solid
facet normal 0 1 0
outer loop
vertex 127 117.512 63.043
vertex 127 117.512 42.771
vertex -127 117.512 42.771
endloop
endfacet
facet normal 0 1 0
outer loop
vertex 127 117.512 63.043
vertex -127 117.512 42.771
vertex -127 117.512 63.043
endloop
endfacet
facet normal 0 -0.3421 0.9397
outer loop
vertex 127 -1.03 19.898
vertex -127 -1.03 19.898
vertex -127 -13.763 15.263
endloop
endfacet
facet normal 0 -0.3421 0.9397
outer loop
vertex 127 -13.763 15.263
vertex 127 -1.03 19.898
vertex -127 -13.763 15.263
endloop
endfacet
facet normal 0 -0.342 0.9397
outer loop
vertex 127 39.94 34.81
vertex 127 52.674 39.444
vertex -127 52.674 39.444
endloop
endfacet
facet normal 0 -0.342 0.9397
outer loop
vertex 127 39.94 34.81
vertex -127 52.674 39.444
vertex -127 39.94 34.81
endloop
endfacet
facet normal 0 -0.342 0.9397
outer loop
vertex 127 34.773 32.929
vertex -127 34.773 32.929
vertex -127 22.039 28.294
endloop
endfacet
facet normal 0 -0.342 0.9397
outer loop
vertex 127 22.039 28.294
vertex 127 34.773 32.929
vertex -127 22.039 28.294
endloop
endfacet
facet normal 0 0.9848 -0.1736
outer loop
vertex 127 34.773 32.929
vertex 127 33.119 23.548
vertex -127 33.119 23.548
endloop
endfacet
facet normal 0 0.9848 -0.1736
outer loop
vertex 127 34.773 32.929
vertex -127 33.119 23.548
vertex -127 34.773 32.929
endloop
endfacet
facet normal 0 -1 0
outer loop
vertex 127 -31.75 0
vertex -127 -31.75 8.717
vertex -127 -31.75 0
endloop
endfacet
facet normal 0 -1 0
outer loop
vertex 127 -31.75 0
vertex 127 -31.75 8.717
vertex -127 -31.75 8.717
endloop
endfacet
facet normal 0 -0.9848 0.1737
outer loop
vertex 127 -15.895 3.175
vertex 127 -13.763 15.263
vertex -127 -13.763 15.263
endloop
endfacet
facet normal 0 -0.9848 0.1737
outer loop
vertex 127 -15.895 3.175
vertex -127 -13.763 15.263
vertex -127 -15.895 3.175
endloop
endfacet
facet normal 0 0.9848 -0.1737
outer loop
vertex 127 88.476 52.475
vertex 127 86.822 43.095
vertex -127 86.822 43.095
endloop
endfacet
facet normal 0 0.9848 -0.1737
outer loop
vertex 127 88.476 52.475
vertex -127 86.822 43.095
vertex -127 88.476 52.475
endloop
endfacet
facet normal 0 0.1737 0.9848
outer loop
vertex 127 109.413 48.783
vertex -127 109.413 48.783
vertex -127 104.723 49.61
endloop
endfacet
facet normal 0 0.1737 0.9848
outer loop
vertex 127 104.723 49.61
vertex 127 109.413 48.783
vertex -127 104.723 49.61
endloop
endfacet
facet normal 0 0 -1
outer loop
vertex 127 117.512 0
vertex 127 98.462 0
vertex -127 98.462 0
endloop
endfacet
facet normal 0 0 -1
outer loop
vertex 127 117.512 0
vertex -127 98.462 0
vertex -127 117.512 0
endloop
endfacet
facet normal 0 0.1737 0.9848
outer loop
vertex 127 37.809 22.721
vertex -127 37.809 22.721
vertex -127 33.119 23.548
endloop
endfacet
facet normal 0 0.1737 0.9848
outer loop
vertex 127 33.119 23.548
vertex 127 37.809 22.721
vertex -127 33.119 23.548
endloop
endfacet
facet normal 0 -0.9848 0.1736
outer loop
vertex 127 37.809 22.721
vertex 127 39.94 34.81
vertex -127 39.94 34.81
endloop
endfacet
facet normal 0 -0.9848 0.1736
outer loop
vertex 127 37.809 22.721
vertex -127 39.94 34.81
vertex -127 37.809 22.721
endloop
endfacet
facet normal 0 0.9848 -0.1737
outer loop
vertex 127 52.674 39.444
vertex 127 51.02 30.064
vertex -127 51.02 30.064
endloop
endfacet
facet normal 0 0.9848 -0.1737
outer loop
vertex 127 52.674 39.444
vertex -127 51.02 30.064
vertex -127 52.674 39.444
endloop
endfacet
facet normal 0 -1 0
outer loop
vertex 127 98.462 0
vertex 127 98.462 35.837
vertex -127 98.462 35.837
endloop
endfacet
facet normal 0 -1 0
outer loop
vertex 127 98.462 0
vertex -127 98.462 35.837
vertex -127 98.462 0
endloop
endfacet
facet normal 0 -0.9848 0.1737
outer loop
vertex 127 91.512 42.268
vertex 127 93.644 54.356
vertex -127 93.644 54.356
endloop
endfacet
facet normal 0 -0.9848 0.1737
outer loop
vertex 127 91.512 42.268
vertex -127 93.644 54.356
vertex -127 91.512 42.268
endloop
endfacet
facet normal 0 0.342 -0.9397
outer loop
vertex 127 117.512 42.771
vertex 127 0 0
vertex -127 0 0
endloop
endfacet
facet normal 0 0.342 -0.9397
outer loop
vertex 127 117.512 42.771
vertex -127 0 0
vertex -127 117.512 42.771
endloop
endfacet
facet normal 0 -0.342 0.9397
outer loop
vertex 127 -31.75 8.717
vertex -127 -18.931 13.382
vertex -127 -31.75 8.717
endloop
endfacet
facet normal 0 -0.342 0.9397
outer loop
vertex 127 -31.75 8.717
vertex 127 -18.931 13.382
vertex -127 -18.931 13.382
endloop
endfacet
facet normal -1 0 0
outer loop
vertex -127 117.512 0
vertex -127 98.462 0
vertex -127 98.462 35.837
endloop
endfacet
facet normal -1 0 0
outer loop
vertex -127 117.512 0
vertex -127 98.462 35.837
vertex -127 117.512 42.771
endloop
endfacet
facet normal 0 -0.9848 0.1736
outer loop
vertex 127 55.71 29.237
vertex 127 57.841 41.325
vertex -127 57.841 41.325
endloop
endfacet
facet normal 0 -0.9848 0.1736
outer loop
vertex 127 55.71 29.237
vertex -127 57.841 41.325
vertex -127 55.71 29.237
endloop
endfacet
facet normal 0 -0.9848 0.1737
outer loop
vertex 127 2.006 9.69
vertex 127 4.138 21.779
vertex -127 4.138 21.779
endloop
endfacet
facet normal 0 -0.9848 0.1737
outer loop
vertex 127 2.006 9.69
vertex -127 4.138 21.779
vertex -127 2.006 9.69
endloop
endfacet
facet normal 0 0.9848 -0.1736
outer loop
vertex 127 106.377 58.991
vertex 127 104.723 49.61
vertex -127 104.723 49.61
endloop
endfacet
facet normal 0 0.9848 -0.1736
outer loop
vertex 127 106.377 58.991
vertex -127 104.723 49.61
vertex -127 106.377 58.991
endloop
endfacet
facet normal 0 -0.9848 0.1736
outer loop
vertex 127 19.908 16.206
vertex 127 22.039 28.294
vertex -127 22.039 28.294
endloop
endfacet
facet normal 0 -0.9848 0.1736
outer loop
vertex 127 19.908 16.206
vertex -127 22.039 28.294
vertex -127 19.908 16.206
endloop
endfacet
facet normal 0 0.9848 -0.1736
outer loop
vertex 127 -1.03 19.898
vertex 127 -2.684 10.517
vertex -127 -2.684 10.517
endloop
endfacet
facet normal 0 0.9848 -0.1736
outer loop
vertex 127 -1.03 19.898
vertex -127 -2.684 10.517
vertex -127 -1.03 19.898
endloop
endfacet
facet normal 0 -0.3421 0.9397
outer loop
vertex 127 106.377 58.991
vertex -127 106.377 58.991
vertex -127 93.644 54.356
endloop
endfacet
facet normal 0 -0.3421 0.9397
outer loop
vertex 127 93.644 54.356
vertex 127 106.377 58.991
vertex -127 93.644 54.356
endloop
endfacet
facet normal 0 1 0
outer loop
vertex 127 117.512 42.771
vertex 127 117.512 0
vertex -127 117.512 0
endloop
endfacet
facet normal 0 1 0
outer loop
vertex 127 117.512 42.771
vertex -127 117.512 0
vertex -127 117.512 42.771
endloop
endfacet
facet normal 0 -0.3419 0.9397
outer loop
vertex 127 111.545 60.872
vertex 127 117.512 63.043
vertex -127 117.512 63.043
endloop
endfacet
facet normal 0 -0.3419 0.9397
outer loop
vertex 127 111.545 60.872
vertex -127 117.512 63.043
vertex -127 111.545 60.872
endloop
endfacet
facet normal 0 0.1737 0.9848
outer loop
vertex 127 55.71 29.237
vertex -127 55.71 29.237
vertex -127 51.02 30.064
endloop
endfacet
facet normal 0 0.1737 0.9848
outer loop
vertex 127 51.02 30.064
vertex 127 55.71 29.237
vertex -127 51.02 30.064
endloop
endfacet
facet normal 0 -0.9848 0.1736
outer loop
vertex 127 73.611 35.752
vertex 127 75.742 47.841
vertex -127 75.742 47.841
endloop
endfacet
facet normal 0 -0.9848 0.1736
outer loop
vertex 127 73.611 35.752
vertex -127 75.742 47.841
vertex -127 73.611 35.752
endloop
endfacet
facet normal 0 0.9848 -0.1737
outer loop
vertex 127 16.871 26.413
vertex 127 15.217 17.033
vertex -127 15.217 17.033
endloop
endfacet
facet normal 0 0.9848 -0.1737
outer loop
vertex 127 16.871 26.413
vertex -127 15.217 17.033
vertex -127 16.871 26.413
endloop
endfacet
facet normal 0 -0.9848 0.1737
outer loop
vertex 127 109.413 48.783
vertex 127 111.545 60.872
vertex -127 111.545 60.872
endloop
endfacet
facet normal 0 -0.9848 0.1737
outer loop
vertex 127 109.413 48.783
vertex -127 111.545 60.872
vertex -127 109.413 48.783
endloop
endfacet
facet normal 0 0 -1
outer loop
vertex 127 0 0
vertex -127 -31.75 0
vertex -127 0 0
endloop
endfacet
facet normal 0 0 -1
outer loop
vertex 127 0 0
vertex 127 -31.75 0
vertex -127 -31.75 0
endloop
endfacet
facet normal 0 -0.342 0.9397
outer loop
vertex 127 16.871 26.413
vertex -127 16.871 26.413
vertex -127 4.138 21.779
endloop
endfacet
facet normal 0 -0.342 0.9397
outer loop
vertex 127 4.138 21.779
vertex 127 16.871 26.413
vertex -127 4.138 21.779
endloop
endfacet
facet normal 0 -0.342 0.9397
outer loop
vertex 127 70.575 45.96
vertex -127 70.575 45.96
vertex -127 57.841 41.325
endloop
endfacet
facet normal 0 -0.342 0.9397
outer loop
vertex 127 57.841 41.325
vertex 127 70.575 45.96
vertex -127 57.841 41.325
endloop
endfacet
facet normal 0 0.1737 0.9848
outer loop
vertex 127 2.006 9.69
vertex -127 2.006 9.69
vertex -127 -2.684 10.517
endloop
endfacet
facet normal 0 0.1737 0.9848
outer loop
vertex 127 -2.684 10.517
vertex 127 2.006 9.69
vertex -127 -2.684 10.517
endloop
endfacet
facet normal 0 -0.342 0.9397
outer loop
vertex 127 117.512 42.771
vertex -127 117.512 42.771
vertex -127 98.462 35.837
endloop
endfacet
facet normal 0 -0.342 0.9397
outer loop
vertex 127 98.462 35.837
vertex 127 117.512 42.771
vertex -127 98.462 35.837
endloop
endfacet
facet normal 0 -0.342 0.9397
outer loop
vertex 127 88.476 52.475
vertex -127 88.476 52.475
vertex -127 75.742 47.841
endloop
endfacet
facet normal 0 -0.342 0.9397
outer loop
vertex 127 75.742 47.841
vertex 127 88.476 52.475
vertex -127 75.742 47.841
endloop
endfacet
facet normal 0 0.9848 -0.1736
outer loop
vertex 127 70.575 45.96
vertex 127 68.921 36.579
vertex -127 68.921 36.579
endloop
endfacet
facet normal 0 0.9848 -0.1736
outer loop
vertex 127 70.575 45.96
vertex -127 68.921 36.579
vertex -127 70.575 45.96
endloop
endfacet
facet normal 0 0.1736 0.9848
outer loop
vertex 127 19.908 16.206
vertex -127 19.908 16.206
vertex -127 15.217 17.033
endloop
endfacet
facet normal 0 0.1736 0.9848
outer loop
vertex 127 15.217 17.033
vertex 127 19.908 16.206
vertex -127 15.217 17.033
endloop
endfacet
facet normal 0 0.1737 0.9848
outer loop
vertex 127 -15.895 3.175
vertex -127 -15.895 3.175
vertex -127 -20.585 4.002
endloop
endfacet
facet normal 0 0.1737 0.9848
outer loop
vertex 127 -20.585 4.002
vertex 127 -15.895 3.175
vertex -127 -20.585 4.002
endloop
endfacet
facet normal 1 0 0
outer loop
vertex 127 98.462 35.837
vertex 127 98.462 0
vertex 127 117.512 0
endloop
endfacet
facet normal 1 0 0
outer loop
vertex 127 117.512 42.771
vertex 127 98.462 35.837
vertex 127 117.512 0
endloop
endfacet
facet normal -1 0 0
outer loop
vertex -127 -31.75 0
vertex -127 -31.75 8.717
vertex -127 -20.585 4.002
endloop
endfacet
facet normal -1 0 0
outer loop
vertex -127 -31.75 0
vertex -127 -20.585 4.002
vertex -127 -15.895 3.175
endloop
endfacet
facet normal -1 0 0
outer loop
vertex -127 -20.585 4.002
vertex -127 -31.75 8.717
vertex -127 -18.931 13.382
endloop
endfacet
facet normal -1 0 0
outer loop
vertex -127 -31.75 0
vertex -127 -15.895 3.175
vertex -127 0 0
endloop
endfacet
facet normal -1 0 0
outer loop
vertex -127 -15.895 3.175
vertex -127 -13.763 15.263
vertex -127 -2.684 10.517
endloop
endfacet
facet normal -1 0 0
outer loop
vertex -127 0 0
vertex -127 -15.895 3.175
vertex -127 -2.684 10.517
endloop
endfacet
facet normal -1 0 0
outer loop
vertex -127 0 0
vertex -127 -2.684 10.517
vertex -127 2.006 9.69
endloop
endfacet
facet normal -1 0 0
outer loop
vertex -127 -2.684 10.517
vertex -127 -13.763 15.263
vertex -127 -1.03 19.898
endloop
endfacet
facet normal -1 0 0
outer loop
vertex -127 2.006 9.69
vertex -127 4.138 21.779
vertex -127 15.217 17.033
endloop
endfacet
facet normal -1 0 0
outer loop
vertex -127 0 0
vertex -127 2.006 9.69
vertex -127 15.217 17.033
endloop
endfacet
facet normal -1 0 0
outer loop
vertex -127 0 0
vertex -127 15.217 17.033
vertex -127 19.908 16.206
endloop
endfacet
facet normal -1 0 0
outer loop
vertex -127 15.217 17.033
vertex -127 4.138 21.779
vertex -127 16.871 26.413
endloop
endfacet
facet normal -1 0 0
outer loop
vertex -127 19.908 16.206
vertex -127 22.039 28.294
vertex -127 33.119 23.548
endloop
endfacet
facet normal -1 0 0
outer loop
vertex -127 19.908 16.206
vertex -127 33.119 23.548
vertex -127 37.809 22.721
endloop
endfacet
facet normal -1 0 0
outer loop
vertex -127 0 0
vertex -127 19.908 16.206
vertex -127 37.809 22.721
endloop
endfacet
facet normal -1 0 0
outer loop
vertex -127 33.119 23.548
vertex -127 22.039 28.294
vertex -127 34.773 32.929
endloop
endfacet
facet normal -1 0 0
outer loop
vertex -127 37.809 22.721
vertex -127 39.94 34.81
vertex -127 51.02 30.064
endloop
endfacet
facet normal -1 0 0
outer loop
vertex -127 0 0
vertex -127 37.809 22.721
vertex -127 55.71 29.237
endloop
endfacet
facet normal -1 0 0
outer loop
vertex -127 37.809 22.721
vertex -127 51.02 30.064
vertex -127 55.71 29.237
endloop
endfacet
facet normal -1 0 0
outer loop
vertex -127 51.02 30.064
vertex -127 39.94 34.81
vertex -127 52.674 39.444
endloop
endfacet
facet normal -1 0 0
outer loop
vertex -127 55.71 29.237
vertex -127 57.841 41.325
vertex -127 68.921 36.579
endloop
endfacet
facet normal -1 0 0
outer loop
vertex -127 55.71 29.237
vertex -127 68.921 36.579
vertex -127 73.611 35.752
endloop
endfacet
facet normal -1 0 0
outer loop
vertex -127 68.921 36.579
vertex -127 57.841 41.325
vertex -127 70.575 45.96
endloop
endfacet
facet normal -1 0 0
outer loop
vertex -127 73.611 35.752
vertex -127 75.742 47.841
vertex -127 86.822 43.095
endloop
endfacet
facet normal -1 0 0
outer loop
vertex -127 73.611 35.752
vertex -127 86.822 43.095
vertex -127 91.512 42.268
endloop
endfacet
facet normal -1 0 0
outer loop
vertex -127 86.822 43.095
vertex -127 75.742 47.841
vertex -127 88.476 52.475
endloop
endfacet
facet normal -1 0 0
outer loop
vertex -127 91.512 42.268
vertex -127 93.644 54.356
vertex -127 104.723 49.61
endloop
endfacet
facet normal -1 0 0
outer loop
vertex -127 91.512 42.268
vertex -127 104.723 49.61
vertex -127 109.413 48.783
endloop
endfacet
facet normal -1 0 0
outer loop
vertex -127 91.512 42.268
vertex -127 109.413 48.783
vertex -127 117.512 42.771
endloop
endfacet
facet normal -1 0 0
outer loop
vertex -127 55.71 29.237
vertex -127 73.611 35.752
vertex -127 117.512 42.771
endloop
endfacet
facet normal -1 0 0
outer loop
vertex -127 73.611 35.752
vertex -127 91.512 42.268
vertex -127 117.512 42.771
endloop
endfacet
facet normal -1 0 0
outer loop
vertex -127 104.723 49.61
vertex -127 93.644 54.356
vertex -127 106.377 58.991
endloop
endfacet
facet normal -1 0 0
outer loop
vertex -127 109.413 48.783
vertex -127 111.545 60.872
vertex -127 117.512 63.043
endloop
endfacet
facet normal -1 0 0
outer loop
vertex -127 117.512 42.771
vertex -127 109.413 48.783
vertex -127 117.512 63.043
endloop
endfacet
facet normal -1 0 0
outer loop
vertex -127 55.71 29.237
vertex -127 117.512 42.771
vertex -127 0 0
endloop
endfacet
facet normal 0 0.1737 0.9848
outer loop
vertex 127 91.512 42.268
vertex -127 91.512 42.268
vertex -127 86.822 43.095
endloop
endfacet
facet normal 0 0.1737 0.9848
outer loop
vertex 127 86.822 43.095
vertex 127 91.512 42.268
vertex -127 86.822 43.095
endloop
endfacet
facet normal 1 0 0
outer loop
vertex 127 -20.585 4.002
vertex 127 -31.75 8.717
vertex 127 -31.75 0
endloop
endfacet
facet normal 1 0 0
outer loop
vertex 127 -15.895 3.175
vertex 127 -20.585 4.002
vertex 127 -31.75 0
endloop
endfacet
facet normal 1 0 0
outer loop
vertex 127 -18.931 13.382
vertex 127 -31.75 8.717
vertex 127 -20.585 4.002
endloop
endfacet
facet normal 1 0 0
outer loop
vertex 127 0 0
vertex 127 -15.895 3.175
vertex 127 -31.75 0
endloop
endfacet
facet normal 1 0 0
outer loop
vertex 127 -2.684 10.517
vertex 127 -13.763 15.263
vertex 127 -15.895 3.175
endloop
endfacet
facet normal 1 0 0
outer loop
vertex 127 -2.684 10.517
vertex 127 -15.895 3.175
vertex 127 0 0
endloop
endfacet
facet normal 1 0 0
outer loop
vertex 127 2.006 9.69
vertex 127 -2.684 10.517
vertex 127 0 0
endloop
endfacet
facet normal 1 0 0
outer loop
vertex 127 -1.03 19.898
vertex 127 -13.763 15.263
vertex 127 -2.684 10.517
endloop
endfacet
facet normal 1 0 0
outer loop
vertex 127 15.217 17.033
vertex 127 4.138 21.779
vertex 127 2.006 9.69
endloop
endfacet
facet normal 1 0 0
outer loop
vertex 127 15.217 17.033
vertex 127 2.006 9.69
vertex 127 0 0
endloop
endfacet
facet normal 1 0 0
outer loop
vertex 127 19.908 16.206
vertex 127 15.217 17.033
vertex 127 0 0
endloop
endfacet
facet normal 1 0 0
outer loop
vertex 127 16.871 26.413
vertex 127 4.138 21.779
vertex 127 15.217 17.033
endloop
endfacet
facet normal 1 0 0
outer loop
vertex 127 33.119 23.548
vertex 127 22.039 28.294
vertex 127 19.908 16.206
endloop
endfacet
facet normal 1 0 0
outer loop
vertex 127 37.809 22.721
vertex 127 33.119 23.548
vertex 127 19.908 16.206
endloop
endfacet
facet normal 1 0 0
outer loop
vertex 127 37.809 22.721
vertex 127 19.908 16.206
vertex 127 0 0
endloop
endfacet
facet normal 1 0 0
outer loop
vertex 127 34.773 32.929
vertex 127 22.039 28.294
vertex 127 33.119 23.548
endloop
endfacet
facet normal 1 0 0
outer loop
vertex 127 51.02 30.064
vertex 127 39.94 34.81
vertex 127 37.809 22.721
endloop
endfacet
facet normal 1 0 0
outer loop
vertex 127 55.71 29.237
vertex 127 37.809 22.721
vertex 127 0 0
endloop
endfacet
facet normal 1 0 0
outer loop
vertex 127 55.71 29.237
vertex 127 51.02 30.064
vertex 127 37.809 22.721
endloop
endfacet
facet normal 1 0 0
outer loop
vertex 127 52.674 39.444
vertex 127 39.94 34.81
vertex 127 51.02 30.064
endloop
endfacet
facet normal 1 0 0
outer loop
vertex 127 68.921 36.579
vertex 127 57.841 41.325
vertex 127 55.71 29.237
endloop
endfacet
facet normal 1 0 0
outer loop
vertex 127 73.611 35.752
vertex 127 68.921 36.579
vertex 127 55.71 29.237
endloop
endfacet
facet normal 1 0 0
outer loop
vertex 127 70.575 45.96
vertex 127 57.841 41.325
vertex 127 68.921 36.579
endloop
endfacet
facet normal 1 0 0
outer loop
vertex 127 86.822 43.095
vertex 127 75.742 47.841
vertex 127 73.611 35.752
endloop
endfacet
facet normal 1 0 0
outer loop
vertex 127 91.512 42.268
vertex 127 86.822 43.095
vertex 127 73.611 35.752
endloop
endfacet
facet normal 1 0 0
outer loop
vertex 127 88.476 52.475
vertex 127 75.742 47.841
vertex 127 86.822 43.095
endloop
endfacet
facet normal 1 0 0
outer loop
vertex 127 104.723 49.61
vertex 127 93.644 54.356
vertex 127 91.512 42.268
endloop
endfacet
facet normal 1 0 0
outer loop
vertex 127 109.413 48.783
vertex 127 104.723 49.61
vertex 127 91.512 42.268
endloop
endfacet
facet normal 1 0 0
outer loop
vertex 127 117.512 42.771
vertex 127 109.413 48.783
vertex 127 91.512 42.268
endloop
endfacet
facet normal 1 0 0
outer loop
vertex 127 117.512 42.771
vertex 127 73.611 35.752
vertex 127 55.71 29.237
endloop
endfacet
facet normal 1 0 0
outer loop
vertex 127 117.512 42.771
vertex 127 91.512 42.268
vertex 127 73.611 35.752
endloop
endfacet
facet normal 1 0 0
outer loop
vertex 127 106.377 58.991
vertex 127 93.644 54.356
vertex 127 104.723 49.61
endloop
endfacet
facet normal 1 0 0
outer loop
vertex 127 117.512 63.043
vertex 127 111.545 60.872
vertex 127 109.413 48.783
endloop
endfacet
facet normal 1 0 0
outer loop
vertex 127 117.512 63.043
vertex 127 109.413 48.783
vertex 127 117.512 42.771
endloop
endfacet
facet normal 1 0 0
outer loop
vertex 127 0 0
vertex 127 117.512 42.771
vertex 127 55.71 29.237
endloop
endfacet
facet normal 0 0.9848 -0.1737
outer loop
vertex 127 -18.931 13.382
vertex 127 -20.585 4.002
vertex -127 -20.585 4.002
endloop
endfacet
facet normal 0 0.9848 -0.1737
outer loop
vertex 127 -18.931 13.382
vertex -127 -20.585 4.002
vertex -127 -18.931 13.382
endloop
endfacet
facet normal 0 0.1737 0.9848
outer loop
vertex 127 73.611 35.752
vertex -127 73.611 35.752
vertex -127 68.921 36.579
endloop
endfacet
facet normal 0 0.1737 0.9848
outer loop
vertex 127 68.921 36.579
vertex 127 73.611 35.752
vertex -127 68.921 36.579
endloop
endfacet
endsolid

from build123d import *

# Parameters (mm, degrees)
F1_DEPTH = 127
F3_DEPTH = 254


with BuildPart() as f1:
    # F0 (on Right) → F1 (new body, symmetric)
    with BuildSketch(Plane.YZ):
        Polygon((-31.75, 0), (0, 0), (117.511749, 42.770779), (117.511749, 63.043365), (111.544701, 60.871538), (109.413234, 48.783386), (104.723087, 49.610386), (106.377086, 58.990679), (93.643557, 54.356054), (91.512089, 42.267902), (86.821942, 43.094902), (88.475941, 52.475196), (75.742412, 47.84057), (73.610945, 35.752419), (68.920798, 36.579418), (70.574797, 45.959712), (57.841268, 41.325086), (55.709801, 29.236935), (51.019654, 30.063934), (52.673653, 39.444228), (39.940123, 34.809603), (37.808656, 22.721451), (33.118509, 23.548451), (34.772508, 32.928744), (22.038979, 28.294119), (19.907512, 16.205967), (15.217365, 17.032967), (16.871364, 26.413261), (4.137835, 21.778635), (2.006367, 9.690484), (-2.68378, 10.517483), (-1.029781, 19.897777), (-13.76331, 15.263151), (-15.894777, 3.175), (-20.584924, 4.001999), (-18.930925, 13.382293), (-31.75, 8.716532), align=None)
    extrude(amount=F1_DEPTH, both=True)


with BuildPart() as f3:
    # F2 (on face) → F3 (new body, through all)
    with BuildSketch(Plane.YZ.offset(127)):
        Polygon((117.511749, 0), (117.511749, 42.770779), (98.461749, 35.837146), (98.461749, 0), align=None)
    extrude(amount=-F3_DEPTH)


solid = Compound([f1.part, f3.part])
